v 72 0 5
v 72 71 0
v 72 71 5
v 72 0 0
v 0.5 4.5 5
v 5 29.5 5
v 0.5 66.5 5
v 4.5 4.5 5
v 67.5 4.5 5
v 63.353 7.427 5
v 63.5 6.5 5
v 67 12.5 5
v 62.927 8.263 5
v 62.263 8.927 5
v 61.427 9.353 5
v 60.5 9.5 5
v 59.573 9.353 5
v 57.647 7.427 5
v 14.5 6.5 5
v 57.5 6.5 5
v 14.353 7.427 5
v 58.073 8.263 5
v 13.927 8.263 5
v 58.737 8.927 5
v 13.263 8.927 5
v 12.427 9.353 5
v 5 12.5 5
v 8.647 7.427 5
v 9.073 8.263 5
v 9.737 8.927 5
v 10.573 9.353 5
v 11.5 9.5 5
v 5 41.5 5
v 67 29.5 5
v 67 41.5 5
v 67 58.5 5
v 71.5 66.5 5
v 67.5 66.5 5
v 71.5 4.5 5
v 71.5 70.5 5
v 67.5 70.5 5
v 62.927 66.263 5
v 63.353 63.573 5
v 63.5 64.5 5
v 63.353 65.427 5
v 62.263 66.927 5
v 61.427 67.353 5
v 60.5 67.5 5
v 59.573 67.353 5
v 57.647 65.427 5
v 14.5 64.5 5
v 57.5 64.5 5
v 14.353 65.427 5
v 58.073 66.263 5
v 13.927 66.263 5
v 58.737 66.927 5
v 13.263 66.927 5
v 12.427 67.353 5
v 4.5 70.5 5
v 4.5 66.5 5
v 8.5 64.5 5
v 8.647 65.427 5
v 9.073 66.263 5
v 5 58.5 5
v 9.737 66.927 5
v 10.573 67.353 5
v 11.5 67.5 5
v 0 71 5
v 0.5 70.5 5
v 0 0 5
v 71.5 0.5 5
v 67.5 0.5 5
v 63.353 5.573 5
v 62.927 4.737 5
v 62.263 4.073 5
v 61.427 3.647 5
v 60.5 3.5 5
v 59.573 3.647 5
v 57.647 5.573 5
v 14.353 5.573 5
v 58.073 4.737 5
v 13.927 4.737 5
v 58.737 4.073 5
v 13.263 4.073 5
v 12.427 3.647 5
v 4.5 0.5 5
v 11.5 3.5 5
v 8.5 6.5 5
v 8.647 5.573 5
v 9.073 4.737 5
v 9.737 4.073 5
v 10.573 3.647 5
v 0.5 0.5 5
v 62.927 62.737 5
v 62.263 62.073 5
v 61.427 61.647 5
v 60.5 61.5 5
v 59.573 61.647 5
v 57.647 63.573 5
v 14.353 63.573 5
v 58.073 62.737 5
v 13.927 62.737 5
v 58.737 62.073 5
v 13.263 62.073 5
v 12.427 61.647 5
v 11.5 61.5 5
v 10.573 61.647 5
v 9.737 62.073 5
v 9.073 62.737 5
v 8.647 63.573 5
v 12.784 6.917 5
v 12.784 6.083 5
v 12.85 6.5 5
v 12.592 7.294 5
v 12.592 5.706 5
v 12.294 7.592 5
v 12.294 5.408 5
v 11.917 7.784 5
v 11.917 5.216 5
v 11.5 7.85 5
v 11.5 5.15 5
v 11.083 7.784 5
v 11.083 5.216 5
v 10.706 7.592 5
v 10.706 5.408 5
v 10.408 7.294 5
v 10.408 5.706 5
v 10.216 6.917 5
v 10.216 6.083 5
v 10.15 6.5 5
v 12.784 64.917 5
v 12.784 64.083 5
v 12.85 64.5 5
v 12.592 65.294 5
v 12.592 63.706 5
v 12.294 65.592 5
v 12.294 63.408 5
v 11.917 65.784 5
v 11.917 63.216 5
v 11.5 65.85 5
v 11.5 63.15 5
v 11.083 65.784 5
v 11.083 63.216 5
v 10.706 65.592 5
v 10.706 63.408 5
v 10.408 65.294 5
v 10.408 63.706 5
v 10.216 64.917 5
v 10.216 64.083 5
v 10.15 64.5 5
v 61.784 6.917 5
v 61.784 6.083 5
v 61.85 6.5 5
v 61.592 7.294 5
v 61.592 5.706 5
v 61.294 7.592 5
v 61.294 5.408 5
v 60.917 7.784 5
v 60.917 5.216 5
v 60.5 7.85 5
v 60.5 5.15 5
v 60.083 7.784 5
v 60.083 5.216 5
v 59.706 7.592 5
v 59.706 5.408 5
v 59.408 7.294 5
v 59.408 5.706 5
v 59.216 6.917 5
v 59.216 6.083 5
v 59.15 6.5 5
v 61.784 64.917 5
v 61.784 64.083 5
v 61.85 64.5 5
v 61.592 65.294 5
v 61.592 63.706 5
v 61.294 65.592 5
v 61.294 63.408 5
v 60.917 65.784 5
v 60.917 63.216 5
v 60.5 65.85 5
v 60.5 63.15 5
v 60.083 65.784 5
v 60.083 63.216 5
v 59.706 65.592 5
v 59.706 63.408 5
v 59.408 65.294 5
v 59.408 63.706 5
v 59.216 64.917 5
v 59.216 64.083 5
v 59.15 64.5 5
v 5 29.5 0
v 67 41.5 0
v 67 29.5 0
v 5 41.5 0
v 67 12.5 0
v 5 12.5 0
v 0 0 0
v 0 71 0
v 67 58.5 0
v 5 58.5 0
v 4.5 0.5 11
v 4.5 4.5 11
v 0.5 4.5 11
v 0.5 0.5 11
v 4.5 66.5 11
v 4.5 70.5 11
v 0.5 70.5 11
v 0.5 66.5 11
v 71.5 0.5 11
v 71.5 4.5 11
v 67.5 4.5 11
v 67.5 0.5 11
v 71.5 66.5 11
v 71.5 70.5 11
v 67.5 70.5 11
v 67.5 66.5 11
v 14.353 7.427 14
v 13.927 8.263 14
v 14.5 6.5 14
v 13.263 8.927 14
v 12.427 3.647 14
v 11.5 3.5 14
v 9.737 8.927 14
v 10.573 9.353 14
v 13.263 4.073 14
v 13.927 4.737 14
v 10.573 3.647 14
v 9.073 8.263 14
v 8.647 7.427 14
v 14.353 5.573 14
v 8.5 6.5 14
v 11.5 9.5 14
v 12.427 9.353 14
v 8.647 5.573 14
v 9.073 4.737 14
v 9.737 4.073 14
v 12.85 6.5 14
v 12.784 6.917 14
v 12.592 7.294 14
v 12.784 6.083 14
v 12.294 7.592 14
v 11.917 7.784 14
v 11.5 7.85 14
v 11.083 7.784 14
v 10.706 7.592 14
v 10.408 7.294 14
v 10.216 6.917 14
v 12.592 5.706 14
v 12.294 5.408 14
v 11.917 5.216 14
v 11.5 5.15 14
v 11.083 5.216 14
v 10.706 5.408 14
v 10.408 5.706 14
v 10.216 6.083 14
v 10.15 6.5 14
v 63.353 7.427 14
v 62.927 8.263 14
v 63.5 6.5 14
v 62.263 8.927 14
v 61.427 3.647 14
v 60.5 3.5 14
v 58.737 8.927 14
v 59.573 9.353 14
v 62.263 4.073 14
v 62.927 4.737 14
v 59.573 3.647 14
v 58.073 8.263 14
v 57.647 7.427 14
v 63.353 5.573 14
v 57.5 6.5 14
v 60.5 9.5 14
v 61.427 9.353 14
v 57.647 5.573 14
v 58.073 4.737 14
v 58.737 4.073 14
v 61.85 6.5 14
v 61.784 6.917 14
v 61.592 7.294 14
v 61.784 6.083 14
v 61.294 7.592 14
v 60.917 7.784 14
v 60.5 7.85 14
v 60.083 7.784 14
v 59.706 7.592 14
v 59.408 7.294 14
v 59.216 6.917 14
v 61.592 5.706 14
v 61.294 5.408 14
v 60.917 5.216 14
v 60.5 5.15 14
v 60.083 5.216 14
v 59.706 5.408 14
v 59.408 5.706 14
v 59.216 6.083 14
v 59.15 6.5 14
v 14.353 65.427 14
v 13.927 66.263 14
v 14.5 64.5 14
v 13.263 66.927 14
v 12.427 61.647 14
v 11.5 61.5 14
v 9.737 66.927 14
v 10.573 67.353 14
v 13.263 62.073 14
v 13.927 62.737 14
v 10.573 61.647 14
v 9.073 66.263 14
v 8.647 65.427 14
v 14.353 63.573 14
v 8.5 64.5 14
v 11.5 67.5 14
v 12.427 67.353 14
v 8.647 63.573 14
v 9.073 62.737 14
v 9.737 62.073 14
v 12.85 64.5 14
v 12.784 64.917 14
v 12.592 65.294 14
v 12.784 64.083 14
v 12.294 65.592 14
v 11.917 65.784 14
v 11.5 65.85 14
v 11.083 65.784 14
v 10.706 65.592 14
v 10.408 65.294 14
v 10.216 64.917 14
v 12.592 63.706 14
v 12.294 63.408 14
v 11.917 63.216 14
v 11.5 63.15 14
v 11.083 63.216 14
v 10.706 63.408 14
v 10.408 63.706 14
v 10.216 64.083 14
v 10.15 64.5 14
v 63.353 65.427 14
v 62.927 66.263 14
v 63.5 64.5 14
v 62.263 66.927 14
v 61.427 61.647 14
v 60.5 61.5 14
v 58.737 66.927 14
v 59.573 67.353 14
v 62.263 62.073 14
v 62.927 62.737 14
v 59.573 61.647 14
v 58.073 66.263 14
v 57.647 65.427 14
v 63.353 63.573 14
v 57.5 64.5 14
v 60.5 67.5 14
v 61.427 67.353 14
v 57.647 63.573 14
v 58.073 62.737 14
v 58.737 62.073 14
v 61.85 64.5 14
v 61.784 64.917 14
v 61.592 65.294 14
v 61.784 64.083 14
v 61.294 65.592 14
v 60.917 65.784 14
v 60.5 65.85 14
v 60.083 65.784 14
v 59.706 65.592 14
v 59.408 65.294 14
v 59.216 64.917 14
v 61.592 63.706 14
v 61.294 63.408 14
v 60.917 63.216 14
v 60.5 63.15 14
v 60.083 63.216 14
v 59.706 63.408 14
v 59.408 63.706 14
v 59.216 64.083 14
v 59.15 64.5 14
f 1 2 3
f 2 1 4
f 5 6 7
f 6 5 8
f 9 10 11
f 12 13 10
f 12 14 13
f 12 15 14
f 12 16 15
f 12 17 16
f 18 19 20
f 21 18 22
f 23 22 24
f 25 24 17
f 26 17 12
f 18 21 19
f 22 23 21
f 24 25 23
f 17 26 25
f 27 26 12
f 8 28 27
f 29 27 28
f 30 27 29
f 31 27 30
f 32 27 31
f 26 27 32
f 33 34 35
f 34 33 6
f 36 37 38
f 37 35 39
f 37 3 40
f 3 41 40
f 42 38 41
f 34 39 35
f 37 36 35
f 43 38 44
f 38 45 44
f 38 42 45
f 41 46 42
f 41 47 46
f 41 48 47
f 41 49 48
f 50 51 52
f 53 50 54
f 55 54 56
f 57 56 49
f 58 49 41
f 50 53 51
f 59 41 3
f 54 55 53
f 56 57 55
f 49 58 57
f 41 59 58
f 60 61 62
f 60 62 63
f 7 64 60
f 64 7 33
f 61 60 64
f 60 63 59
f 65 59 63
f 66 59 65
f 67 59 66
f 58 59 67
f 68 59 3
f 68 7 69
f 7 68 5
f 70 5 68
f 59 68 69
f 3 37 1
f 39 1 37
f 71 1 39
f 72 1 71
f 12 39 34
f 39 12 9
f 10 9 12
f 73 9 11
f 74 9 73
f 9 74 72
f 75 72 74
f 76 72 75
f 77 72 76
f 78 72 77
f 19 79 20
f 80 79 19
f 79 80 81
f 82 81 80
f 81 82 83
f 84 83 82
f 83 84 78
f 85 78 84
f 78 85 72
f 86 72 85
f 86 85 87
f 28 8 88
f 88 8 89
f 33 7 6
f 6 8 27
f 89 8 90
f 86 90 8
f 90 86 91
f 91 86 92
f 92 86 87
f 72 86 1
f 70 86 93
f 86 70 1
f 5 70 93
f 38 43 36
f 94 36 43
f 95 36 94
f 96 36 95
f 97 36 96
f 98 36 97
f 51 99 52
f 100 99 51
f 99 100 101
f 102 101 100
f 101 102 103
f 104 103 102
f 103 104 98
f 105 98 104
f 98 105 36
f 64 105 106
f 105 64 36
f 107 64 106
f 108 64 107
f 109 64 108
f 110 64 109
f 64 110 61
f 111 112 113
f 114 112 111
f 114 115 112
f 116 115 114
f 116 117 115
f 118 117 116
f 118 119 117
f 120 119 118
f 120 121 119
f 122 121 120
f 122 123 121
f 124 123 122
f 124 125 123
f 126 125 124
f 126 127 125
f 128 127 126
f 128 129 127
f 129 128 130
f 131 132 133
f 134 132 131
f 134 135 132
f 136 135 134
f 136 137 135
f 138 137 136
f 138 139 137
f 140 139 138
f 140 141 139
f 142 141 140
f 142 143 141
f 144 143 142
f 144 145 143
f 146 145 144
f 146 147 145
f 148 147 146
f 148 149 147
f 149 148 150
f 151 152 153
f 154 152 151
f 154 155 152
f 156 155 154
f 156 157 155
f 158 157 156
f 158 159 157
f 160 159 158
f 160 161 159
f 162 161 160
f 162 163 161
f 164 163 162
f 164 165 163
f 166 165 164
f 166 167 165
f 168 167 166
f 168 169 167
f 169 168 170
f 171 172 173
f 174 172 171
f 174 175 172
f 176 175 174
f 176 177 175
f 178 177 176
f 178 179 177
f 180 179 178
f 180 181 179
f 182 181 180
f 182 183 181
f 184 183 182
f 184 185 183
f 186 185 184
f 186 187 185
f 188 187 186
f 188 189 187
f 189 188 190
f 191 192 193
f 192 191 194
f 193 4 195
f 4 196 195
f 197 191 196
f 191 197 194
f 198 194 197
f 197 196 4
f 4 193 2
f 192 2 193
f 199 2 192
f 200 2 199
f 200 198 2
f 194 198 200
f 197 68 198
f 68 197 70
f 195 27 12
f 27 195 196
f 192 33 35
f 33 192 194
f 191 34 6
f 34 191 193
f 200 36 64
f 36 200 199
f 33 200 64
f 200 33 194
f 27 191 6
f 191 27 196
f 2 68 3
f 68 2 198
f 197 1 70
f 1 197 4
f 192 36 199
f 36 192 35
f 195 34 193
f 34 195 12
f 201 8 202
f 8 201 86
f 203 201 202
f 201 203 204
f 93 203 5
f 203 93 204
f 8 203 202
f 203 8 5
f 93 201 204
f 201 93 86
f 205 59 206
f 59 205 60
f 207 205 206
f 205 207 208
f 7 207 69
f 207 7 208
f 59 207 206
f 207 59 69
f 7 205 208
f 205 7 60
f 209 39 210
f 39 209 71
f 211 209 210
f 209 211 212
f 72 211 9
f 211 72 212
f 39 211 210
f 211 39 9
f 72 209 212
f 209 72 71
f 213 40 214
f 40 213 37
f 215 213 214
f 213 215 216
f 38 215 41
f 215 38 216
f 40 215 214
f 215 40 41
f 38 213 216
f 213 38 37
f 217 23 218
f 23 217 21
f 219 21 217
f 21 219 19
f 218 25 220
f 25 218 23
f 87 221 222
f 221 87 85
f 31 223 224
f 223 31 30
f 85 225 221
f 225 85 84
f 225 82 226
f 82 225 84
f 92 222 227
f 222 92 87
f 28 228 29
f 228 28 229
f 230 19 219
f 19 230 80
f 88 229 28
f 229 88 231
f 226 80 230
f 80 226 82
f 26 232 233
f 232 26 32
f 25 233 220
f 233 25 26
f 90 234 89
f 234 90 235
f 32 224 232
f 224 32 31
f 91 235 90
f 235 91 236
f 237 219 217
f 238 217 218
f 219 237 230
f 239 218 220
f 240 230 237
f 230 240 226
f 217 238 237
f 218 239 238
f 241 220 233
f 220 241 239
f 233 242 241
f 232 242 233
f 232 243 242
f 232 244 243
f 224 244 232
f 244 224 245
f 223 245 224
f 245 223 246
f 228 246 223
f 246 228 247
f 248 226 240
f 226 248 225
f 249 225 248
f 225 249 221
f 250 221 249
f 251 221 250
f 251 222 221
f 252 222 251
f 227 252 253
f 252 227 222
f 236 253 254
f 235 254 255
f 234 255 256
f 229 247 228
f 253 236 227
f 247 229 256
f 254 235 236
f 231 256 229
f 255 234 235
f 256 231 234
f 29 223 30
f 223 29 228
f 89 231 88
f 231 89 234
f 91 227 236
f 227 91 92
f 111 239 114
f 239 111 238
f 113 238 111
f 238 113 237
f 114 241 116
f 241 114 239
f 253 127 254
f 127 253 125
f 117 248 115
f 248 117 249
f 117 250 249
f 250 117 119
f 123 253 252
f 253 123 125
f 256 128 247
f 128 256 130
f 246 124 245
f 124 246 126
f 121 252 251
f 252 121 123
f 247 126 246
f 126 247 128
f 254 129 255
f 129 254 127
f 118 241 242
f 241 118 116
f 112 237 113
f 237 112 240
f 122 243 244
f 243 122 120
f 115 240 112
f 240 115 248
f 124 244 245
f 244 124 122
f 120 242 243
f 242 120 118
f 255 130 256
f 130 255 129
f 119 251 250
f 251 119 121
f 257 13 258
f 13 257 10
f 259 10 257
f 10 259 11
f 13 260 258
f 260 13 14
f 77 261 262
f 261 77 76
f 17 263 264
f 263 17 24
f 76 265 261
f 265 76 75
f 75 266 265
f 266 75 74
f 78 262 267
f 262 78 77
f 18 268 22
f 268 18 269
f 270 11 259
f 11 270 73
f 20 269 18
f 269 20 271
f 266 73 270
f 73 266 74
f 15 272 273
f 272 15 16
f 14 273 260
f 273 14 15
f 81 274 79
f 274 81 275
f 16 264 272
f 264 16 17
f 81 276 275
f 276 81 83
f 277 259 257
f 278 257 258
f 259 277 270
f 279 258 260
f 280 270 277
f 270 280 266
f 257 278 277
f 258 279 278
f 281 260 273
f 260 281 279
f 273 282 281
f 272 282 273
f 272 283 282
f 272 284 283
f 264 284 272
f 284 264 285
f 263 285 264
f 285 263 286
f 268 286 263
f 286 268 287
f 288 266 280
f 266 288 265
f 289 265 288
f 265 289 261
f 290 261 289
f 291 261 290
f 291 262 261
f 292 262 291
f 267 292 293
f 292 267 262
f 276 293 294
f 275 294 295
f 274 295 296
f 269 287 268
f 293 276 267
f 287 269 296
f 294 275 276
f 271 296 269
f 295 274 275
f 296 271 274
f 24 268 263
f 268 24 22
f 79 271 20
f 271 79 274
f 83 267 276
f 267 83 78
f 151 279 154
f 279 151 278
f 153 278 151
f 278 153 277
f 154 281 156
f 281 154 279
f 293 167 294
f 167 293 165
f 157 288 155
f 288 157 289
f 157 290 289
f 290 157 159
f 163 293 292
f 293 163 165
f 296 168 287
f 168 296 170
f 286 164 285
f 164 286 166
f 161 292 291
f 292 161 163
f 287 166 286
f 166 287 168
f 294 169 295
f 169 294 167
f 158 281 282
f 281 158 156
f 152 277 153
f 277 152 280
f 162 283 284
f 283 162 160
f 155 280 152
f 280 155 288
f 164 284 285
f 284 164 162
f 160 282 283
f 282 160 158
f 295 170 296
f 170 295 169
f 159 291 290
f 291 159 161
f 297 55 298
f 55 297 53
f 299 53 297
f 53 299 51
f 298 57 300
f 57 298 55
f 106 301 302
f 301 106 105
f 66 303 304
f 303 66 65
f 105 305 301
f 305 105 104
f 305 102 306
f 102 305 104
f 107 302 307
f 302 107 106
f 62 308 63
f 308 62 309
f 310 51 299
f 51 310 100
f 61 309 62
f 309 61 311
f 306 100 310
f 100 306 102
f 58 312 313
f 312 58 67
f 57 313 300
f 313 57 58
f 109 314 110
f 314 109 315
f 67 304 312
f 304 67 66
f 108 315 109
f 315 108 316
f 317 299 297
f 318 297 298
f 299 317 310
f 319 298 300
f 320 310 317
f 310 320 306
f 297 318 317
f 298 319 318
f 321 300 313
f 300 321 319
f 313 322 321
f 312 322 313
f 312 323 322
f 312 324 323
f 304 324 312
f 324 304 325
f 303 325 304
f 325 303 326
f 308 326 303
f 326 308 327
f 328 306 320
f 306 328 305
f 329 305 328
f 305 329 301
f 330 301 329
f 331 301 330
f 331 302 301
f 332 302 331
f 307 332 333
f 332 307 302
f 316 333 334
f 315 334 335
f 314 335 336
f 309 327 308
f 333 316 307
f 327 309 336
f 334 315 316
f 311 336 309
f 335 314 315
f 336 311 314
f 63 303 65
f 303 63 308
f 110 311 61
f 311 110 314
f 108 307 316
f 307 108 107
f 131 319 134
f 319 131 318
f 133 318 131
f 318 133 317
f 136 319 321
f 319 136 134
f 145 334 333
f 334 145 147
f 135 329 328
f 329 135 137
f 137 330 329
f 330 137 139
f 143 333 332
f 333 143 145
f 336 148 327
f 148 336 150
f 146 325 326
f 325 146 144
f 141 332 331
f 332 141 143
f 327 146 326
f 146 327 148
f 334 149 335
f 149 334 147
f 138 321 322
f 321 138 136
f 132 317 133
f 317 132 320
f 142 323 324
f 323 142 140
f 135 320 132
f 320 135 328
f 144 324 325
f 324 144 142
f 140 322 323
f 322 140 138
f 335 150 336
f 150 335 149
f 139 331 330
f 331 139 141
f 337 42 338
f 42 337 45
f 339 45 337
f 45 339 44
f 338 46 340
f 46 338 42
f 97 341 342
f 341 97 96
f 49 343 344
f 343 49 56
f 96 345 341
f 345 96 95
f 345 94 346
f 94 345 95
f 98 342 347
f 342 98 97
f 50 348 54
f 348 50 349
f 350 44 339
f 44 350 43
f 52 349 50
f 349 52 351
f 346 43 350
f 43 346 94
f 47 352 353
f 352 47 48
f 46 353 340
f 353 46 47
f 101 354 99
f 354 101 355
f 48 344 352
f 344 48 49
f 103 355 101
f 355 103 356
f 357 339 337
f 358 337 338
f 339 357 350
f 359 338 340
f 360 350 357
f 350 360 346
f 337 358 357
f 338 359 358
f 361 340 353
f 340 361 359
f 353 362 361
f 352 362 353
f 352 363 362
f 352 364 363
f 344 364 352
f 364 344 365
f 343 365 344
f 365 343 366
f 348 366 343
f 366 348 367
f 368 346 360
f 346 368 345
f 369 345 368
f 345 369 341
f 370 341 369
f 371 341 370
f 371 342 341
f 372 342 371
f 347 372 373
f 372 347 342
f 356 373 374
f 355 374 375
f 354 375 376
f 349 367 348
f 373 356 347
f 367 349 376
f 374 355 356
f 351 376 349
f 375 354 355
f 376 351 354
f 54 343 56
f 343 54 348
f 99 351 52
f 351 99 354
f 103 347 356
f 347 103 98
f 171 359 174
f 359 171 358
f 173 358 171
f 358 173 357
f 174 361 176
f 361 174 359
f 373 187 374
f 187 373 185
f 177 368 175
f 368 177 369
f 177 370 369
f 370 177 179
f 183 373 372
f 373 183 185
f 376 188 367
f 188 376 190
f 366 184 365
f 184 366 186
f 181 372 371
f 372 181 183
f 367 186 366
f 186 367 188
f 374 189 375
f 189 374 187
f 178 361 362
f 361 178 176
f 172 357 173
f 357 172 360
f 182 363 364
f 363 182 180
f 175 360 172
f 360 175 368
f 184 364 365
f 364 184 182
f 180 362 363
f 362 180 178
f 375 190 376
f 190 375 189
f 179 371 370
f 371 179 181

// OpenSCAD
// Neato XV Signature Pro - Outer Left Pod BASE
// Print flat (ribbed face down), no supports needed.
// Has 4x4x6mm raised bosses at all 4 post locations.
// Bosses fit into matching sockets in outer_left_pod_sides.scad.
//
// PRINT ORIENTATION: ribbed bottom face flat on bed, standoffs point up.

// ============================================================
// PARAMETERS (must match outer_left_pod_sides.scad)
// ============================================================

pod_width  = 72;
pod_depth  = 71;

rail_w = 5;
rib_w        = 12;

standoff_h    = 9;
standoff_od   = 6;
standoff_hole = 2.7; // M2.5


boss_size = 4;
boss_h    = 6;

yahboom_hole_x_span = 49;
yahboom_hole_y_span = 58;

yahboom_x_left  = (pod_width - yahboom_hole_x_span) / 2;
yahboom_x_right = yahboom_x_left + yahboom_hole_x_span;

yahboom_y_front = (pod_depth - yahboom_hole_y_span) / 2;
yahboom_y_rear  = yahboom_y_front + yahboom_hole_y_span;
yahboom_y_mid   = (yahboom_y_front + yahboom_y_rear) / 2;

rib_positions = [yahboom_y_front, yahboom_y_mid, yahboom_y_rear];

yahboom_holes = [
    [yahboom_x_left,  yahboom_y_front],
    [yahboom_x_right, yahboom_y_front],
    [yahboom_x_left,  yahboom_y_rear ],
    [yahboom_x_right, yahboom_y_rear ],
];

// Boss locations — center of each post footprint
// Outer (left) side: back, front
// Inner (right) side: back, front
boss_locations = [
    [rail_w/2,             rail_w/2              ],  // outer back
    [rail_w/2,             pod_depth - rail_w/2  ],  // outer front
    [pod_width - rail_w/2, rail_w/2              ],  // inner back
    [pod_width - rail_w/2, pod_depth - rail_w/2  ],  // inner front
];

// ============================================================
// MODULES
// ============================================================

module ribbed_bottom() {
    // Outer (left) edge
    cube([rail_w, pod_depth, rail_w]);
    // Inner (right) edge
    translate([pod_width - rail_w, 0, 0])
        cube([rail_w, pod_depth, rail_w]);
    // Back edge
    cube([pod_width, rail_w, rail_w]);
    // Front edge
    translate([0, pod_depth - rail_w, 0])
        cube([pod_width, rail_w, rail_w]);

    // Ribs — gaps between ribs provide cable routing space
    for (y_center = rib_positions) {
        translate([0, y_center - rib_w / 2, 0])
            cube([pod_width, rib_w, rail_w]);
    }
}

module standoff(h, hole_d) {
    difference() {
        cylinder(h=h, d=standoff_od, $fn=20);
        cylinder(h=h + 0.1, d=hole_d, $fn=20);
    }
}

// ============================================================
// MAIN
// ============================================================

union() {
    ribbed_bottom();

    for (b = boss_locations) {
        translate([b[0] - boss_size/2, b[1] - boss_size/2, rail_w])
            cube([boss_size, boss_size, boss_h]);
    }

    for (h = yahboom_holes) {
        translate([h[0], h[1], rail_w])
            standoff(standoff_h, standoff_hole);
    }
}
